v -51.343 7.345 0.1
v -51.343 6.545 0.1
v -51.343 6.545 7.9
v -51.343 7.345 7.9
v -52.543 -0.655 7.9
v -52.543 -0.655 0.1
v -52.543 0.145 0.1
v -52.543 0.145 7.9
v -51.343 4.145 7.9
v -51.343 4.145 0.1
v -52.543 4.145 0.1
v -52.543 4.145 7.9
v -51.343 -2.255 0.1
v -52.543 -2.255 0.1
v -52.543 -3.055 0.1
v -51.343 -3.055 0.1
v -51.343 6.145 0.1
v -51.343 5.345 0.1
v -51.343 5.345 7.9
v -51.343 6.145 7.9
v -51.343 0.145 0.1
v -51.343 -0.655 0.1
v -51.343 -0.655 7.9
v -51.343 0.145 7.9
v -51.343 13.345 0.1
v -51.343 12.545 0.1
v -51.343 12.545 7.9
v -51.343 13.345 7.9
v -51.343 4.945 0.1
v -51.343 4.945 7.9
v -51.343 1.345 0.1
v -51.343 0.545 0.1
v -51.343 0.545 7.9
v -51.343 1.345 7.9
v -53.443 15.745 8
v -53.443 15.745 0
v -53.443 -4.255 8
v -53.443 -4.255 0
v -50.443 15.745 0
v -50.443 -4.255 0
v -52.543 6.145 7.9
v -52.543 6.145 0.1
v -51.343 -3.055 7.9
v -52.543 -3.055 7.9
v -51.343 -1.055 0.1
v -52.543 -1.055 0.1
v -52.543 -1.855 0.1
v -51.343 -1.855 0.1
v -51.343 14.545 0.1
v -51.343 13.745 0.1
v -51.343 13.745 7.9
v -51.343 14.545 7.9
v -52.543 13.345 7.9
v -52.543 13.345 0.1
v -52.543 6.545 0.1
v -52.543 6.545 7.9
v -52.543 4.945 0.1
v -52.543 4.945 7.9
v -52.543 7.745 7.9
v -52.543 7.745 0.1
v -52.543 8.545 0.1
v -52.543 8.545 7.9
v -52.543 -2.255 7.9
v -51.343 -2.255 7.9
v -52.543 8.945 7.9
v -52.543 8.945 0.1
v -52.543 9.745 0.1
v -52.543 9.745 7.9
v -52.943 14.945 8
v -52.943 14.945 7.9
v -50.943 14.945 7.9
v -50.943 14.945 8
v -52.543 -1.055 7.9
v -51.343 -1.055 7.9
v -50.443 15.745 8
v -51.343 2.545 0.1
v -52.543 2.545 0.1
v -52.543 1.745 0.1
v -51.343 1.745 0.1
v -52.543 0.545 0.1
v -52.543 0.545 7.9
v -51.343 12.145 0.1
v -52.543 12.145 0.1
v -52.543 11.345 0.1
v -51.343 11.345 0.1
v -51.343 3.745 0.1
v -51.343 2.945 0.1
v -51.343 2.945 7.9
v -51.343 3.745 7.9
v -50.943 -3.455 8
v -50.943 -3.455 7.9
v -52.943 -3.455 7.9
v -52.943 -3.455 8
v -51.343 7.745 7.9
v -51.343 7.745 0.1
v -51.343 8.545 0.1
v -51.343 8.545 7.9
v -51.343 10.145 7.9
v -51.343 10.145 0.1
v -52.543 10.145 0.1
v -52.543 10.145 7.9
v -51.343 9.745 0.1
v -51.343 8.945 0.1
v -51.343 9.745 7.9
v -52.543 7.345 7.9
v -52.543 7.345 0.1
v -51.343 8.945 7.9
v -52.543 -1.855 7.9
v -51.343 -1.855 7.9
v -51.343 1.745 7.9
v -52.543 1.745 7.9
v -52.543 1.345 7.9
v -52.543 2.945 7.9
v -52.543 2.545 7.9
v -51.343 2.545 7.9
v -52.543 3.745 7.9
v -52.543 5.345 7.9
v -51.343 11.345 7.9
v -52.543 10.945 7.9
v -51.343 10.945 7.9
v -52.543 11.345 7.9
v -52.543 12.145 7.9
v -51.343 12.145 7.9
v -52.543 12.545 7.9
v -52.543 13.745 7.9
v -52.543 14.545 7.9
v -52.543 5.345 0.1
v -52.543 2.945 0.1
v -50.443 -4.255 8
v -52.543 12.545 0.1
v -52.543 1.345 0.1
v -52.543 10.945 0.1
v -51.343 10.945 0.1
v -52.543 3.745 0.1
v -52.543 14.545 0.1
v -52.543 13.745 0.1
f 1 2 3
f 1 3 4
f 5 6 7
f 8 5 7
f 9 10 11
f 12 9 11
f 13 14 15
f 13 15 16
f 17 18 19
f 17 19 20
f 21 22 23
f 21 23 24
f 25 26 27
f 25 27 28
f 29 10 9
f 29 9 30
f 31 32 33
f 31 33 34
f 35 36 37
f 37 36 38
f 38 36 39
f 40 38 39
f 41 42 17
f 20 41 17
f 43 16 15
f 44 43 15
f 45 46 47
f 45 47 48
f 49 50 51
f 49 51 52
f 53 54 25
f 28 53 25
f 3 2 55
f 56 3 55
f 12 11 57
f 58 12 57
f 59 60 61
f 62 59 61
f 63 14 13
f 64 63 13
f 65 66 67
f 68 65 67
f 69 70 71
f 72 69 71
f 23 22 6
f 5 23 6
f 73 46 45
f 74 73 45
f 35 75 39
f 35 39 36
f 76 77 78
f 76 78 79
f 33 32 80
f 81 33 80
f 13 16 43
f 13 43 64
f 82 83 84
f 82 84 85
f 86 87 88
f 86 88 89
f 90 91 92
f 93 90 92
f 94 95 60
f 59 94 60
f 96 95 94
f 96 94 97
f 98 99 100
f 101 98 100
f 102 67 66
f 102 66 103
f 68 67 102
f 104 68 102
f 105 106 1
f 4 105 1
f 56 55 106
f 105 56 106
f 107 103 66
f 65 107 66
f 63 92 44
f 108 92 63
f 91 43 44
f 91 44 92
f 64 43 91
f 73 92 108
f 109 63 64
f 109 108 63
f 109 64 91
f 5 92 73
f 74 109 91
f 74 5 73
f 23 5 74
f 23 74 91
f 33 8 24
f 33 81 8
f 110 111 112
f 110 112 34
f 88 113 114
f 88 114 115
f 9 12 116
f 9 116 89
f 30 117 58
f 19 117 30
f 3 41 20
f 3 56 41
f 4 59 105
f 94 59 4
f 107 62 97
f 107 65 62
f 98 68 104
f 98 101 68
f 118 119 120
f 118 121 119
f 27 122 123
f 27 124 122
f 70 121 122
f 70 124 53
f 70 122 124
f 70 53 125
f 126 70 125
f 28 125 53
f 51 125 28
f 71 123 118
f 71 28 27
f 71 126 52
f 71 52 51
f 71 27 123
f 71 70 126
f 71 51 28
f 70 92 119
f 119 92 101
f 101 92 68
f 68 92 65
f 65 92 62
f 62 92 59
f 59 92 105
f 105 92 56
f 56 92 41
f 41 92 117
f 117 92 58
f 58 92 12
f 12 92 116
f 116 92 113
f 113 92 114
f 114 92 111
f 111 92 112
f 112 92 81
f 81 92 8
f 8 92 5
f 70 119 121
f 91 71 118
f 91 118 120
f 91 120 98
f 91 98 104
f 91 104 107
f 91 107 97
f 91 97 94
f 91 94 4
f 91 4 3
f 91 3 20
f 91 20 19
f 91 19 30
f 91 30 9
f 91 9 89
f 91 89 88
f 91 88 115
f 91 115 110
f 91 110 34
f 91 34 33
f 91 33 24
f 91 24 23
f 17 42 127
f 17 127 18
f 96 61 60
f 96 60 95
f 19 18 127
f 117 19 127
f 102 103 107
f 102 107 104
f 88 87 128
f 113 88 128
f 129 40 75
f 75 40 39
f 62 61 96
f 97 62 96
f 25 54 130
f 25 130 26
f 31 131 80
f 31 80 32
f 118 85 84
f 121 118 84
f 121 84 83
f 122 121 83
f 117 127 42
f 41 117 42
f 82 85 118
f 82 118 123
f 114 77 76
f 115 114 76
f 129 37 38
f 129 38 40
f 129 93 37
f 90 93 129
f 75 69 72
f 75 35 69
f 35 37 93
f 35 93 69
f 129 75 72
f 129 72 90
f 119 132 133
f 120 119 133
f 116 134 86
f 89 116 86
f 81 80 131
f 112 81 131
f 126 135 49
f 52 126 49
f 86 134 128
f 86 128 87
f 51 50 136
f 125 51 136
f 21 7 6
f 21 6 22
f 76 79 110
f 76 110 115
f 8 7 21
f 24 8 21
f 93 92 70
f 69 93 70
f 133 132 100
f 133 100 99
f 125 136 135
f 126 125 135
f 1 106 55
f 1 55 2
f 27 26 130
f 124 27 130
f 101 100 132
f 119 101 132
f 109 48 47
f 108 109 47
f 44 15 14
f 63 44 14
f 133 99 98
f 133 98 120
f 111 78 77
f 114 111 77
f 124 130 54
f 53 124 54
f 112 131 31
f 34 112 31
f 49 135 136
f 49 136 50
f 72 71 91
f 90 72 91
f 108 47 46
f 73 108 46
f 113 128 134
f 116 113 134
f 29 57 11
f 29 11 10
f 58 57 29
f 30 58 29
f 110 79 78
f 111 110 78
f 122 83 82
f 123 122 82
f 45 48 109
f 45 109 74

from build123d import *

# Parameters (mm, degrees)
F0_W     = 0.4
F0_H     = 0.8
F0_W_2   = 1.2
F1_DEPTH = 8
F0_H_2   = 0.4
F2_DEPTH = 7.9
F3_DEPTH = 0.1


with BuildPart() as f1:
    # F0 (on Top) → F1 (new body)
    with BuildSketch(Plane.XY):
        Polygon((-52.9434660673, 15.7446456737), (-53.4434660673, 15.7446456737), (-53.4434660673, -4.2553543263), (-52.9434660673, -4.2553543263), (-52.9434660673, -3.4553543263), (-52.9434660673, -3.0553543263), (-52.9434660673, -2.2553543263), (-52.9434660673, -1.8553543263), (-52.9434660673, -1.0553543263), (-52.9434660673, -0.6553543263), (-52.9434660673, 0.1446456737), (-52.9434660673, 0.5446456737), (-52.9434660673, 1.3446456737), (-52.9434660673, 1.7446456737), (-52.9434660673, 2.5446456737), (-52.9434660673, 2.9446456737), (-52.9434660673, 3.7446456737), (-52.9434660673, 4.1446456737), (-52.9434660673, 4.9446456737), (-52.9434660673, 5.3446456737), (-52.9434660673, 6.1446456737), (-52.9434660673, 6.5446456737), (-52.9434660673, 7.3446456737), (-52.9434660673, 7.7446456737), (-52.9434660673, 8.5446456737), (-52.9434660673, 8.9446456737), (-52.9434660673, 9.7446456737), (-52.9434660673, 10.1446456737), (-52.9434660673, 10.9446456737), (-52.9434660673, 11.3446456737), (-52.9434660673, 12.1446456737), (-52.9434660673, 12.5446456737), (-52.9434660673, 13.3446456737), (-52.9434660673, 13.7446456737), (-52.9434660673, 14.5446456737), (-52.9434660673, 14.9446456737), align=None)
        with Locations((-52.7434660673, 15.3446456737)):
            Rectangle(F0_W, F0_H)
        with Locations((-51.9434660673, 15.3446456737)):
            Rectangle(F0_W_2, F0_H)
        with Locations((-52.7434660673, -3.8553543263)):
            Rectangle(F0_W, F0_H)
        with Locations((-51.1434660673, 15.3446456737)):
            Rectangle(F0_W, F0_H)
        with Locations((-51.9434660673, -3.8553543263)):
            Rectangle(F0_W_2, F0_H)
        Polygon((-50.4434660673, 15.7446456737), (-50.9434660673, 15.7446456737), (-50.9434660673, 14.9446456737), (-50.9434660673, 14.5446456737), (-50.9434660673, 13.7446456737), (-50.9434660673, 13.3446456737), (-50.9434660673, 12.5446456737), (-50.9434660673, 12.1446456737), (-50.9434660673, 11.3446456737), (-50.9434660673, 10.9446456737), (-50.9434660673, 10.1446456737), (-50.9434660673, 9.7446456737), (-50.9434660673, 8.9446456737), (-50.9434660673, 8.5446456737), (-50.9434660673, 7.7446456737), (-50.9434660673, 7.3446456737), (-50.9434660673, 6.5446456737), (-50.9434660673, 6.1446456737), (-50.9434660673, 5.3446456737), (-50.9434660673, 4.9446456737), (-50.9434660673, 4.1446456737), (-50.9434660673, 3.7446456737), (-50.9434660673, 2.9446456737), (-50.9434660673, 2.5446456737), (-50.9434660673, 1.7446456737), (-50.9434660673, 1.3446456737), (-50.9434660673, 0.5446456737), (-50.9434660673, 0.1446456737), (-50.9434660673, -0.6553543263), (-50.9434660673, -1.0553543263), (-50.9434660673, -1.8553543263), (-50.9434660673, -2.2553543263), (-50.9434660673, -3.0553543263), (-50.9434660673, -3.4553543263), (-50.9434660673, -4.2553543263), (-50.4434660673, -4.2553543263), align=None)
        with Locations((-51.1434660673, -3.8553543263)):
            Rectangle(F0_W, F0_H)
    extrude(amount=F1_DEPTH)

    # F0 (on Top) → F2 (join)
    with BuildSketch(Plane.XY):
        with Locations((-52.7434660673, 14.7446456737)):
            Rectangle(F0_W, F0_H_2)
        with Locations((-52.7434660673, 14.1446456737)):
            Rectangle(F0_W, F0_H)
        with Locations((-52.7434660673, 13.5446456737)):
            Rectangle(F0_W, F0_H_2)
        with Locations((-52.7434660673, 12.9446456737)):
            Rectangle(F0_W, F0_H)
        with Locations((-52.7434660673, 12.3446456737)):
            Rectangle(F0_W, F0_H_2)
        with Locations((-52.7434660673, 11.7446456737)):
            Rectangle(F0_W, F0_H)
        with Locations((-52.7434660673, 11.1446456737)):
            Rectangle(F0_W, F0_H_2)
        with Locations((-52.7434660673, 10.5446456737)):
            Rectangle(F0_W, F0_H)
        with Locations((-52.7434660673, 9.9446456737)):
            Rectangle(F0_W, F0_H_2)
        with Locations((-51.9434660673, 9.9446456737)):
            Rectangle(F0_W_2, F0_H_2)
        with Locations((-51.9434660673, 11.1446456737)):
            Rectangle(F0_W_2, F0_H_2)
        with Locations((-51.9434660673, 12.3446456737)):
            Rectangle(F0_W_2, F0_H_2)
        with Locations((-51.9434660673, 13.5446456737)):
            Rectangle(F0_W_2, F0_H_2)
        with Locations((-51.9434660673, 14.7446456737)):
            Rectangle(F0_W_2, F0_H_2)
        with Locations((-51.9434660673, -3.2553543263)):
            Rectangle(F0_W_2, F0_H_2)
        with Locations((-51.9434660673, -2.0553543263)):
            Rectangle(F0_W_2, F0_H_2)
        with Locations((-51.9434660673, -0.8553543263)):
            Rectangle(F0_W_2, F0_H_2)
        with Locations((-51.9434660673, 0.3446456737)):
            Rectangle(F0_W_2, F0_H_2)
        with Locations((-51.9434660673, 1.5446456737)):
            Rectangle(F0_W_2, F0_H_2)
        with Locations((-51.9434660673, 2.7446456737)):
            Rectangle(F0_W_2, F0_H_2)
        with Locations((-51.9434660673, 3.9446456737)):
            Rectangle(F0_W_2, F0_H_2)
        with Locations((-51.9434660673, 5.1446456737)):
            Rectangle(F0_W_2, F0_H_2)
        with Locations((-51.9434660673, 6.3446456737)):
            Rectangle(F0_W_2, F0_H_2)
        with Locations((-51.9434660673, 7.5446456737)):
            Rectangle(F0_W_2, F0_H_2)
        with Locations((-51.9434660673, 8.7446456737)):
            Rectangle(F0_W_2, F0_H_2)
        with Locations((-51.1434660673, 14.7446456737)):
            Rectangle(F0_W, F0_H_2)
        with Locations((-51.1434660673, 13.5446456737)):
            Rectangle(F0_W, F0_H_2)
        with Locations((-51.1434660673, 12.3446456737)):
            Rectangle(F0_W, F0_H_2)
        with Locations((-51.1434660673, 11.1446456737)):
            Rectangle(F0_W, F0_H_2)
        with Locations((-51.1434660673, 9.9446456737)):
            Rectangle(F0_W, F0_H_2)
        with Locations((-51.1434660673, 8.7446456737)):
            Rectangle(F0_W, F0_H_2)
        with Locations((-51.1434660673, 7.5446456737)):
            Rectangle(F0_W, F0_H_2)
        with Locations((-51.1434660673, 6.3446456737)):
            Rectangle(F0_W, F0_H_2)
        with Locations((-51.1434660673, 5.1446456737)):
            Rectangle(F0_W, F0_H_2)
        with Locations((-51.1434660673, 3.9446456737)):
            Rectangle(F0_W, F0_H_2)
        with Locations((-51.1434660673, 2.7446456737)):
            Rectangle(F0_W, F0_H_2)
        with Locations((-51.1434660673, 1.5446456737)):
            Rectangle(F0_W, F0_H_2)
        with Locations((-51.1434660673, 0.3446456737)):
            Rectangle(F0_W, F0_H_2)
        with Locations((-51.1434660673, -0.8553543263)):
            Rectangle(F0_W, F0_H_2)
        with Locations((-51.1434660673, -2.0553543263)):
            Rectangle(F0_W, F0_H_2)
        with Locations((-51.1434660673, -3.2553543263)):
            Rectangle(F0_W, F0_H_2)
        with Locations((-52.7434660673, -3.2553543263)):
            Rectangle(F0_W, F0_H_2)
        with Locations((-52.7434660673, -2.0553543263)):
            Rectangle(F0_W, F0_H_2)
        with Locations((-52.7434660673, -0.8553543263)):
            Rectangle(F0_W, F0_H_2)
        with Locations((-52.7434660673, 0.3446456737)):
            Rectangle(F0_W, F0_H_2)
        with Locations((-52.7434660673, 1.5446456737)):
            Rectangle(F0_W, F0_H_2)
        with Locations((-52.7434660673, 2.7446456737)):
            Rectangle(F0_W, F0_H_2)
        with Locations((-52.7434660673, 3.9446456737)):
            Rectangle(F0_W, F0_H_2)
        with Locations((-52.7434660673, 5.1446456737)):
            Rectangle(F0_W, F0_H_2)
        with Locations((-52.7434660673, 6.3446456737)):
            Rectangle(F0_W, F0_H_2)
        with Locations((-52.7434660673, 7.5446456737)):
            Rectangle(F0_W, F0_H_2)
        with Locations((-52.7434660673, 8.7446456737)):
            Rectangle(F0_W, F0_H_2)
        with Locations((-51.1434660673, 14.1446456737)):
            Rectangle(F0_W, F0_H)
        with Locations((-51.1434660673, 12.9446456737)):
            Rectangle(F0_W, F0_H)
        with Locations((-51.1434660673, 11.7446456737)):
            Rectangle(F0_W, F0_H)
        with Locations((-51.1434660673, 10.5446456737)):
            Rectangle(F0_W, F0_H)
        with Locations((-51.1434660673, 9.3446456737)):
            Rectangle(F0_W, F0_H)
        with Locations((-52.7434660673, 9.3446456737)):
            Rectangle(F0_W, F0_H)
        with Locations((-52.7434660673, 8.1446456737)):
            Rectangle(F0_W, F0_H)
        with Locations((-51.1434660673, 8.1446456737)):
            Rectangle(F0_W, F0_H)
        with Locations((-51.1434660673, 6.9446456737)):
            Rectangle(F0_W, F0_H)
        with Locations((-52.7434660673, 6.9446456737)):
            Rectangle(F0_W, F0_H)
        with Locations((-52.7434660673, 5.7446456737)):
            Rectangle(F0_W, F0_H)
        with Locations((-51.1434660673, 5.7446456737)):
            Rectangle(F0_W, F0_H)
        with Locations((-51.1434660673, 4.5446456737)):
            Rectangle(F0_W, F0_H)
        with Locations((-52.7434660673, 4.5446456737)):
            Rectangle(F0_W, F0_H)
        with Locations((-52.7434660673, 3.3446456737)):
            Rectangle(F0_W, F0_H)
        with Locations((-51.1434660673, 3.3446456737)):
            Rectangle(F0_W, F0_H)
        with Locations((-51.1434660673, 2.1446456737)):
            Rectangle(F0_W, F0_H)
        with Locations((-52.7434660673, 2.1446456737)):
            Rectangle(F0_W, F0_H)
        with Locations((-52.7434660673, 0.9446456737)):
            Rectangle(F0_W, F0_H)
        with Locations((-51.1434660673, 0.9446456737)):
            Rectangle(F0_W, F0_H)
        with Locations((-51.1434660673, -0.2553543263)):
            Rectangle(F0_W, F0_H)
        with Locations((-52.7434660673, -0.2553543263)):
            Rectangle(F0_W, F0_H)
        with Locations((-52.7434660673, -1.4553543263)):
            Rectangle(F0_W, F0_H)
        with Locations((-51.1434660673, -1.4553543263)):
            Rectangle(F0_W, F0_H)
        with Locations((-51.1434660673, -2.6553543263)):
            Rectangle(F0_W, F0_H)
        with Locations((-52.7434660673, -2.6553543263)):
            Rectangle(F0_W, F0_H)
    extrude(amount=F2_DEPTH)

    # F0 (on Top) → F3 (join)
    with BuildSketch(Plane.XY):
        with Locations((-51.9434660673, 14.1446456737)):
            Rectangle(F0_W_2, F0_H)
        with Locations((-51.9434660673, 12.9446456737)):
            Rectangle(F0_W_2, F0_H)
        with Locations((-51.9434660673, 11.7446456737)):
            Rectangle(F0_W_2, F0_H)
        with Locations((-51.9434660673, 10.5446456737)):
            Rectangle(F0_W_2, F0_H)
        with Locations((-51.9434660673, 9.3446456737)):
            Rectangle(F0_W_2, F0_H)
        with Locations((-51.9434660673, 8.1446456737)):
            Rectangle(F0_W_2, F0_H)
        with Locations((-51.9434660673, 6.9446456737)):
            Rectangle(F0_W_2, F0_H)
        with Locations((-51.9434660673, 5.7446456737)):
            Rectangle(F0_W_2, F0_H)
        with Locations((-51.9434660673, 4.5446456737)):
            Rectangle(F0_W_2, F0_H)
        with Locations((-51.9434660673, 3.3446456737)):
            Rectangle(F0_W_2, F0_H)
        with Locations((-51.9434660673, 2.1446456737)):
            Rectangle(F0_W_2, F0_H)
        with Locations((-51.9434660673, 0.9446456737)):
            Rectangle(F0_W_2, F0_H)
        with Locations((-51.9434660673, -0.2553543263)):
            Rectangle(F0_W_2, F0_H)
        with Locations((-51.9434660673, -1.4553543263)):
            Rectangle(F0_W_2, F0_H)
        with Locations((-51.9434660673, -2.6553543263)):
            Rectangle(F0_W_2, F0_H)
    extrude(amount=F3_DEPTH)


solid = f1.part
